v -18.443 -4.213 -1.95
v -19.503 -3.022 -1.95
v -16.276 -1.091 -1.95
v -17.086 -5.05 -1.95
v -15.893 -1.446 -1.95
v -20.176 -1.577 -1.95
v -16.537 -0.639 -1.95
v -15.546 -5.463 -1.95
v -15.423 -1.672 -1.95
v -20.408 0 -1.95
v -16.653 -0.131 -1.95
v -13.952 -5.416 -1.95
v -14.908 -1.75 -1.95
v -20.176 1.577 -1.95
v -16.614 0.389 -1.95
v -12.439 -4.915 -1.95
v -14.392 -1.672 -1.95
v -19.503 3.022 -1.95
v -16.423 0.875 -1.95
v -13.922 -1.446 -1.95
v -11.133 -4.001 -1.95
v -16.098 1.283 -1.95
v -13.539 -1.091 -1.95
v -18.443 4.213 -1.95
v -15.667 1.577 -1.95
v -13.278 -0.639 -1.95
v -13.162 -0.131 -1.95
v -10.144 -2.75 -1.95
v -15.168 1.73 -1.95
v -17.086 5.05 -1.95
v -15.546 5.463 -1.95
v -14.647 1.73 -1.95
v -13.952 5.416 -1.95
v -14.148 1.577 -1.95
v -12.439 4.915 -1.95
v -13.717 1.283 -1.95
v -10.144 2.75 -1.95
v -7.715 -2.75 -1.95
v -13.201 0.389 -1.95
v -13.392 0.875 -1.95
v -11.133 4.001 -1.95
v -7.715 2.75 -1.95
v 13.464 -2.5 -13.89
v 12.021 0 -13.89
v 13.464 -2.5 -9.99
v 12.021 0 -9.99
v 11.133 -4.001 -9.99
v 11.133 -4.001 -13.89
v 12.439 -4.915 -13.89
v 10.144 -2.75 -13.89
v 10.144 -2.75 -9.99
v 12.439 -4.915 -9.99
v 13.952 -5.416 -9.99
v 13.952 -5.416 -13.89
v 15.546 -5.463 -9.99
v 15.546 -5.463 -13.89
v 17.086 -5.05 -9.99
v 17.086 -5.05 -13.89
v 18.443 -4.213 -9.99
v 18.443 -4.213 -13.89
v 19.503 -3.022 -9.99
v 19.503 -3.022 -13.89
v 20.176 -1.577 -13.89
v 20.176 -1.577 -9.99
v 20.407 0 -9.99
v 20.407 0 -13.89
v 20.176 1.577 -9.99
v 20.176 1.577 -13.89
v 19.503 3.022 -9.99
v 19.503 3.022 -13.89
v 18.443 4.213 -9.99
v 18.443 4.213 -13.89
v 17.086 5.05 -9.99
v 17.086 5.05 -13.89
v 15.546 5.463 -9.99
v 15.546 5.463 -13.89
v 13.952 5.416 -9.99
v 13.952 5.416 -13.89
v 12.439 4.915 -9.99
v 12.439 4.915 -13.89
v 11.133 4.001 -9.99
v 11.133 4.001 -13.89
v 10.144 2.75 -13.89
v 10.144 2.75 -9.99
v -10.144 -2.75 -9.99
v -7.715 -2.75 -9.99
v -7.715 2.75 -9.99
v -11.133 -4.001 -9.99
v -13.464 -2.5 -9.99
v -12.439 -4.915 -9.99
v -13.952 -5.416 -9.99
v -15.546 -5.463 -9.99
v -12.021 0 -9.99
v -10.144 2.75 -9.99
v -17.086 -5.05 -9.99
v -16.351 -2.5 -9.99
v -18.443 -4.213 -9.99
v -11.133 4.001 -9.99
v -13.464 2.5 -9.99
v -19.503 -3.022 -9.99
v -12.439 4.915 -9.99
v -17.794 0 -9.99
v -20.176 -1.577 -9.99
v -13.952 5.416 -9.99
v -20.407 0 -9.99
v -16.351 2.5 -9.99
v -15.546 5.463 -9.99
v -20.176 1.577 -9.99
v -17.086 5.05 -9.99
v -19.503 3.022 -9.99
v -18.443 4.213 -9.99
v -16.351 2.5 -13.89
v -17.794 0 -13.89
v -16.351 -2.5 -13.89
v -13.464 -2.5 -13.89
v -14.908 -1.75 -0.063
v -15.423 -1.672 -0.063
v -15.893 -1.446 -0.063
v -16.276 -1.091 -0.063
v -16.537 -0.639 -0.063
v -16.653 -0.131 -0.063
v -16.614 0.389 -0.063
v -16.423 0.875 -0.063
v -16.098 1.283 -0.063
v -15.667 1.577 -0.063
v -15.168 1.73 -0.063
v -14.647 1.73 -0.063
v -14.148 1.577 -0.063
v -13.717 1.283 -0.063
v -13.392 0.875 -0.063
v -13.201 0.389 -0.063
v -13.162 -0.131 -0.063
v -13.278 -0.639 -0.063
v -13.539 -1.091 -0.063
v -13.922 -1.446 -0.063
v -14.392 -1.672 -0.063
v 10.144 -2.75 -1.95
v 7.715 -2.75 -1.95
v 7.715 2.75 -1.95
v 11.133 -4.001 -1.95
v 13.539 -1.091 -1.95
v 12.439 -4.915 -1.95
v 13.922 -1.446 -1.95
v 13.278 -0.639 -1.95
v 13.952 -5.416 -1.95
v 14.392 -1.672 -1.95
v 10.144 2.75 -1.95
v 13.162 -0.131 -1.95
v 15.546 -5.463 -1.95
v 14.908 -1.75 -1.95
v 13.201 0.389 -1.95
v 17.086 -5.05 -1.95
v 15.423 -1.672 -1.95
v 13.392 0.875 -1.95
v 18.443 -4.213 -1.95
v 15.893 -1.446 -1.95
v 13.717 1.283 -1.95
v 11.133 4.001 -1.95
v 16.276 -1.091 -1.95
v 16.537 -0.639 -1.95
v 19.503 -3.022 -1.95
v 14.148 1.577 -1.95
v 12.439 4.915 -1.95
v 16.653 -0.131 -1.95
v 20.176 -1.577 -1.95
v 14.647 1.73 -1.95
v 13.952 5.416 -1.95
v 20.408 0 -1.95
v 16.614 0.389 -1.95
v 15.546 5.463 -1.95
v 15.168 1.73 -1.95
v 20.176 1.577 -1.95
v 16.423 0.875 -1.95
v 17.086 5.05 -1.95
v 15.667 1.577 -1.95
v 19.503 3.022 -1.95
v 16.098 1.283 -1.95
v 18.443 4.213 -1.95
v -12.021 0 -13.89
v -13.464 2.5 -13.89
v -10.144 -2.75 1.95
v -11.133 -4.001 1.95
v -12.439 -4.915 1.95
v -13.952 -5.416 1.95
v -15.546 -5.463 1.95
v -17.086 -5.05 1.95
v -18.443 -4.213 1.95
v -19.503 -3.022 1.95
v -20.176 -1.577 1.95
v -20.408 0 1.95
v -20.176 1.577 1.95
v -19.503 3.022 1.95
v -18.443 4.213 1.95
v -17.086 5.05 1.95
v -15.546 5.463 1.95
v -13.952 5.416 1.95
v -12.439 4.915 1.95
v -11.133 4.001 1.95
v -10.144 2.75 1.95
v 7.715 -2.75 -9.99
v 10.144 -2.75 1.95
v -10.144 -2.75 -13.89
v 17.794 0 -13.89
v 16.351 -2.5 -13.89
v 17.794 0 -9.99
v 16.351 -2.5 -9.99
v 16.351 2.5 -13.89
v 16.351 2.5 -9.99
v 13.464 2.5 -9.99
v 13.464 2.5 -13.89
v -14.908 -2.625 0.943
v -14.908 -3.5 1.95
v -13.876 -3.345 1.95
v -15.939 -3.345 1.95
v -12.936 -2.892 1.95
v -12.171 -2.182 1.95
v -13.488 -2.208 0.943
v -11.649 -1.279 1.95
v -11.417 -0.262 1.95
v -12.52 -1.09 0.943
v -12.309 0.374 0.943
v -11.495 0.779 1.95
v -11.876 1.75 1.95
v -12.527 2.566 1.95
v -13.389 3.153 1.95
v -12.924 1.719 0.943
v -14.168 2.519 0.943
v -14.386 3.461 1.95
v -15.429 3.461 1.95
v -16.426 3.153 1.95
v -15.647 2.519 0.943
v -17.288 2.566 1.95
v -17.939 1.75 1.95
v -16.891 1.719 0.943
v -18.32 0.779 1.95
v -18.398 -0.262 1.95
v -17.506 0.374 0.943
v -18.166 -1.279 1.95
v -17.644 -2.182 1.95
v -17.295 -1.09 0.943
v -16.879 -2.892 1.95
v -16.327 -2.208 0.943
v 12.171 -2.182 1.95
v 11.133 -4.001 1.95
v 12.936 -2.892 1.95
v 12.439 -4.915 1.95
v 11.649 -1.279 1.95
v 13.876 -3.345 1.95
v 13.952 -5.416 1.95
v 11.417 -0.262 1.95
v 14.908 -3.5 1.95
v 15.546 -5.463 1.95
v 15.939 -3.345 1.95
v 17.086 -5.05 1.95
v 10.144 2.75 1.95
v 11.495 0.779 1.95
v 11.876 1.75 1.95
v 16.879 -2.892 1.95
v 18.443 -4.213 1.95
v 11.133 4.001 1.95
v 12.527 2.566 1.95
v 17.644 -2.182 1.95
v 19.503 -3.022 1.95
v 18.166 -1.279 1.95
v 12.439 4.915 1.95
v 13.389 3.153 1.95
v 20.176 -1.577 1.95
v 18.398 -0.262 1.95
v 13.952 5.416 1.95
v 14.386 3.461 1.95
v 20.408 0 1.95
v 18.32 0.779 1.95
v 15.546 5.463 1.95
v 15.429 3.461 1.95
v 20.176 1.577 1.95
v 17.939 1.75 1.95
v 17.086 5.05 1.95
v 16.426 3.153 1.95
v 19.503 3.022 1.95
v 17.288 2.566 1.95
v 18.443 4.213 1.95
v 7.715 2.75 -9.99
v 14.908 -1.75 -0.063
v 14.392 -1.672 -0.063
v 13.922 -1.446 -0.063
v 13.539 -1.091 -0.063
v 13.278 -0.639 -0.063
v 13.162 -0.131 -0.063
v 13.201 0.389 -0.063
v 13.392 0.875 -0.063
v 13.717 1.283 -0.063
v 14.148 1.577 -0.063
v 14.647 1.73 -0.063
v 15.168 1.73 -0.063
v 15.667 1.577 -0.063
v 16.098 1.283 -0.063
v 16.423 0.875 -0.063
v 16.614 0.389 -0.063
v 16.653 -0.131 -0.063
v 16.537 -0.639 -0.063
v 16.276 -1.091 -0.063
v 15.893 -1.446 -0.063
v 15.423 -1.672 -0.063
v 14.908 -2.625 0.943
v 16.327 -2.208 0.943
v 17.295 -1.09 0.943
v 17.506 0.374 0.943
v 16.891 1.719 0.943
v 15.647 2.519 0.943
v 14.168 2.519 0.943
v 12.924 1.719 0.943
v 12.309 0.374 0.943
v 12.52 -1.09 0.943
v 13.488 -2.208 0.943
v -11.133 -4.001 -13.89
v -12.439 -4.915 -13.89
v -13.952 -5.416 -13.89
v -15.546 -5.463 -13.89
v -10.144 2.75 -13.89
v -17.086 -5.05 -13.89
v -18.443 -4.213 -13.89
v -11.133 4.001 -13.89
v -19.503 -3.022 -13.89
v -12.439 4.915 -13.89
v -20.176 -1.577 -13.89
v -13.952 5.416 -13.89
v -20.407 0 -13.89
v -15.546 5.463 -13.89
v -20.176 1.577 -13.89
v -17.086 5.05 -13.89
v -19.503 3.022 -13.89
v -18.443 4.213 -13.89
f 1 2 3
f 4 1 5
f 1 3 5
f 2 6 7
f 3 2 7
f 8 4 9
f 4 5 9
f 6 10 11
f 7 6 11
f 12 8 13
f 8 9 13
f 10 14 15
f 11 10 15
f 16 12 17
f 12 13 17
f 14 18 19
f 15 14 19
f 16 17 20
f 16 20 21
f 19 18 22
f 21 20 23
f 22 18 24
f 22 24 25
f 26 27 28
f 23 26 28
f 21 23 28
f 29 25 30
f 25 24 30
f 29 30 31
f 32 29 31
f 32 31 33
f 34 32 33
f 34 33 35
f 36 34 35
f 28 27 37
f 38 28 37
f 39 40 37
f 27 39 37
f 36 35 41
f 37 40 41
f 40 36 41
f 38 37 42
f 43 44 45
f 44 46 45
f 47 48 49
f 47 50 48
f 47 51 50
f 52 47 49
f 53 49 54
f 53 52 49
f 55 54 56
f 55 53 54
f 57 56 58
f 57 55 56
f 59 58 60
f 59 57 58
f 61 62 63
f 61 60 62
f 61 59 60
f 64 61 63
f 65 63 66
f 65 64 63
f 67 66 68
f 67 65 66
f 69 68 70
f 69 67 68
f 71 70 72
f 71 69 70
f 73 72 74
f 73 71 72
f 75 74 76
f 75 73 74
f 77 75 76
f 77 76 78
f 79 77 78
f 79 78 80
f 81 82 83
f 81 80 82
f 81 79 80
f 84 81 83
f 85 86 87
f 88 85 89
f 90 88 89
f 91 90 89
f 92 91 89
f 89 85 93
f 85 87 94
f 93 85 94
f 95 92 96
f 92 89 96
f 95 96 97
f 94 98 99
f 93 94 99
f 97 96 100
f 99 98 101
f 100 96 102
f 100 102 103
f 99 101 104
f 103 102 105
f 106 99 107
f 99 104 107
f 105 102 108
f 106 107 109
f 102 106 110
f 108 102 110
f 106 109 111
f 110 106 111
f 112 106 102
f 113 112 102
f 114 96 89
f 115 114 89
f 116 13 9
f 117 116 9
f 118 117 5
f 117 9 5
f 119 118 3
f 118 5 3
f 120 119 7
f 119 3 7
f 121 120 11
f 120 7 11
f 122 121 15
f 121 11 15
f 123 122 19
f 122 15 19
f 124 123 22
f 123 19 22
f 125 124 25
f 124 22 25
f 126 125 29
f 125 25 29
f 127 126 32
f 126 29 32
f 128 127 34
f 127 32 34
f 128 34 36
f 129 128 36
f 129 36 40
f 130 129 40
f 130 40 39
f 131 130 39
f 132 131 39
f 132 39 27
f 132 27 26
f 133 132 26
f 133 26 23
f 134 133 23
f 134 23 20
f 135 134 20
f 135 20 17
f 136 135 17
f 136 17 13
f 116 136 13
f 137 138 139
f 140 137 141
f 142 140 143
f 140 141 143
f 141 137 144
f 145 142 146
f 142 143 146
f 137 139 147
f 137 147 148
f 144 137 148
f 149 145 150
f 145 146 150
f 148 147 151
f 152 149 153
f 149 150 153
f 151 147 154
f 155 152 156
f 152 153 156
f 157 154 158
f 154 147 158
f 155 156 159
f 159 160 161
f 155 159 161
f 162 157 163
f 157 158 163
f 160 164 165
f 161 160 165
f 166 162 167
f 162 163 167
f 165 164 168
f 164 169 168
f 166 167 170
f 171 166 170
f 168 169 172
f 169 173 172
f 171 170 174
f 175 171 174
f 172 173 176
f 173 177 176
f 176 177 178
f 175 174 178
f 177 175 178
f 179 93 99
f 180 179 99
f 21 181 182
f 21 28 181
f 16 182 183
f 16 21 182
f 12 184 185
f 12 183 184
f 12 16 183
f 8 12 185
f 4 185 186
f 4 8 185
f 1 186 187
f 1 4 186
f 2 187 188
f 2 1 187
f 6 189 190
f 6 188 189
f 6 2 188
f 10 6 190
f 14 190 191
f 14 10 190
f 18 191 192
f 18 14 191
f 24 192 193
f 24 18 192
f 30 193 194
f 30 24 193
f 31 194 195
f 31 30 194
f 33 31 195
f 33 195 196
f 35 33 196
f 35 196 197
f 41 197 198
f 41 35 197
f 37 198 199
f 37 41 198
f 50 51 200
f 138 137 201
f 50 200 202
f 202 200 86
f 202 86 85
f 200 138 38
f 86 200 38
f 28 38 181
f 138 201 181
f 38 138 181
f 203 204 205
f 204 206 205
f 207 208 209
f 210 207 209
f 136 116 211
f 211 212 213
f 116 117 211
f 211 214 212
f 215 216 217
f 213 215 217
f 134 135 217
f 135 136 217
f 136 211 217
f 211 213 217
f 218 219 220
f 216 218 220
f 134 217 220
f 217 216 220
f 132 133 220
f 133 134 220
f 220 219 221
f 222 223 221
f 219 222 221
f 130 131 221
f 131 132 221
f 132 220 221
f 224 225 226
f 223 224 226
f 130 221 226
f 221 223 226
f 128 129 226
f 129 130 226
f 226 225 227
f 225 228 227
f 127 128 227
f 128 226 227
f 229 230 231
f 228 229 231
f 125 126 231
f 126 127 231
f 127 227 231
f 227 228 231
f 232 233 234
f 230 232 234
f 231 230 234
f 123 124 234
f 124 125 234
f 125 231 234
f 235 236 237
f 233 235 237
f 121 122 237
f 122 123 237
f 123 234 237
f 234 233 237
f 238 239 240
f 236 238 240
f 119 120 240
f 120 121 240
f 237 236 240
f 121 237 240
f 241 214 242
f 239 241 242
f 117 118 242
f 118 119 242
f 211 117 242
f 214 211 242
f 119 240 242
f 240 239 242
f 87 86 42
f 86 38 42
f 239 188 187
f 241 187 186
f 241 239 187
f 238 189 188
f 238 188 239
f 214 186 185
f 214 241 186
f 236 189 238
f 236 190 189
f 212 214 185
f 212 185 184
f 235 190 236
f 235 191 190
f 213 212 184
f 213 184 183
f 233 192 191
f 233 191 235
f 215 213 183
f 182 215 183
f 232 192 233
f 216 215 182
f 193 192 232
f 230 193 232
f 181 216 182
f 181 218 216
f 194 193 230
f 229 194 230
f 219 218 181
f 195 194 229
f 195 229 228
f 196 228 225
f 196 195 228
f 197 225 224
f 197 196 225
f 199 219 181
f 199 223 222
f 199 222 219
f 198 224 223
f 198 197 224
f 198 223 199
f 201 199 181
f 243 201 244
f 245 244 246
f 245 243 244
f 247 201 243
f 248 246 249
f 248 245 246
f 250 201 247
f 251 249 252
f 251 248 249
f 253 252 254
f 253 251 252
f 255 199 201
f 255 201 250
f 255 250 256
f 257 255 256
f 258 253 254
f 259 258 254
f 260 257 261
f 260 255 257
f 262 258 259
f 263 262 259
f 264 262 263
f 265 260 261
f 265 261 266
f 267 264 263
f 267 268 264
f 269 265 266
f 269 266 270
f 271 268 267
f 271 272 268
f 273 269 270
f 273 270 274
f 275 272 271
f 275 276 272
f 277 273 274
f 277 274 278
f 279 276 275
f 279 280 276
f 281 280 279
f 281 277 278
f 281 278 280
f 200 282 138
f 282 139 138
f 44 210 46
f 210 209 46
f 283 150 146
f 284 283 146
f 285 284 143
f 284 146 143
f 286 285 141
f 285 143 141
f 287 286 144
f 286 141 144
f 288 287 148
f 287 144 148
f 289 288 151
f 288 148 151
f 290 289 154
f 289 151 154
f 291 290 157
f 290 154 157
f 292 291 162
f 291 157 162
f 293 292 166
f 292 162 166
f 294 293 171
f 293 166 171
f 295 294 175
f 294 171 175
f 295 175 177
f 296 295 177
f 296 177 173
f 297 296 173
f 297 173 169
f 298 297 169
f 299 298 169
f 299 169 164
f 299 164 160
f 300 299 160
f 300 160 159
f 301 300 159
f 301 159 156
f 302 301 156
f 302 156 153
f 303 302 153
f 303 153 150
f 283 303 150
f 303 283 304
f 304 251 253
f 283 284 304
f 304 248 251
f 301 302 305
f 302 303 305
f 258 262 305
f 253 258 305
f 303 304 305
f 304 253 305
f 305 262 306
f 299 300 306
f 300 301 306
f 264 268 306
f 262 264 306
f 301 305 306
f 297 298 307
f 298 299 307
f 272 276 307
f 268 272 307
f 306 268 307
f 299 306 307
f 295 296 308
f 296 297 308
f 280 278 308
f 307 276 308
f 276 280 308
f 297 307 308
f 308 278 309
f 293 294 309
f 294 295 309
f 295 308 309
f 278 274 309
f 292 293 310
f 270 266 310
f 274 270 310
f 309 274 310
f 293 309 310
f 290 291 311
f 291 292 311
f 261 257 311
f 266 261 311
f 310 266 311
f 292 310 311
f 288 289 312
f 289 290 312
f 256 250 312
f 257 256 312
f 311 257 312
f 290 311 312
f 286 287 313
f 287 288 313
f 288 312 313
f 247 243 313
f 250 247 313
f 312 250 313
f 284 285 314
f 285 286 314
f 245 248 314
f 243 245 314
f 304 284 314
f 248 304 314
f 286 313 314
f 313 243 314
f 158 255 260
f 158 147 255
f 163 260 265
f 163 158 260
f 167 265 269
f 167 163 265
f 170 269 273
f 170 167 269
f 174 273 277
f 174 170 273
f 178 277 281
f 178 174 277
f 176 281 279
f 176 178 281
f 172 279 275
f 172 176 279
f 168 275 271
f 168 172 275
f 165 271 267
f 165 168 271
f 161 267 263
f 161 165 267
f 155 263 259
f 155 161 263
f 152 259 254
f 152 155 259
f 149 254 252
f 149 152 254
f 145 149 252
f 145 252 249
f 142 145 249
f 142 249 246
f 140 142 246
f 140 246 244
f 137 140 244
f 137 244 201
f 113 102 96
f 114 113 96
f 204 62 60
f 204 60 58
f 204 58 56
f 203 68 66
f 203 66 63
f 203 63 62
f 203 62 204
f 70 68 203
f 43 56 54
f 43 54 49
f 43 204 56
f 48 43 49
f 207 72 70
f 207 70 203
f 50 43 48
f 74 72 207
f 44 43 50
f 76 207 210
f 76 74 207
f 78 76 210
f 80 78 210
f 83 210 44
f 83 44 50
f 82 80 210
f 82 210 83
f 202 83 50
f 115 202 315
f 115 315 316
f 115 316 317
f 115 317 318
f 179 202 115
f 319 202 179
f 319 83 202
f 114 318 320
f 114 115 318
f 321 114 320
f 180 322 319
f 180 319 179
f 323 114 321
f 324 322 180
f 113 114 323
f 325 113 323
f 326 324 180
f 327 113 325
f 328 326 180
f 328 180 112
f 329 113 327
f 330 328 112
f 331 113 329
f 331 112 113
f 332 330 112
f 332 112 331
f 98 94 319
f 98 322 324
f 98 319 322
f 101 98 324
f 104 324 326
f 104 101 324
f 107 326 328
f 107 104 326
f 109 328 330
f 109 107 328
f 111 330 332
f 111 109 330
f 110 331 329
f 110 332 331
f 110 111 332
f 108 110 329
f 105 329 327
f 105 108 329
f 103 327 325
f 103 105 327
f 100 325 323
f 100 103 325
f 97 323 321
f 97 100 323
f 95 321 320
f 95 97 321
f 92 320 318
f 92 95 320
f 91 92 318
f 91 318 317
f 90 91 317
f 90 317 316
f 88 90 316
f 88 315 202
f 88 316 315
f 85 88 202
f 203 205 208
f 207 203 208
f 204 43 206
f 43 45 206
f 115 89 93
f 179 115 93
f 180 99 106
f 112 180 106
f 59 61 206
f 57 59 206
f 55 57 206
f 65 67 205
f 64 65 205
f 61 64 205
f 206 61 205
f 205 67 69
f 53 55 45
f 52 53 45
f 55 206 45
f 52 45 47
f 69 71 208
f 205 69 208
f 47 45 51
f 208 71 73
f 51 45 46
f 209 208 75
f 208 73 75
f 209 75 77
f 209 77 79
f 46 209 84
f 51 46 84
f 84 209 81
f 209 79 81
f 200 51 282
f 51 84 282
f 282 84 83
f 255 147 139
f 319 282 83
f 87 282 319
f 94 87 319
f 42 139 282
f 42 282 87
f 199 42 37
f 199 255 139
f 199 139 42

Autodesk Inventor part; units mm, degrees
ref_plane "YZ Plane" through (0, 0, 0) normal (1, 0, 0) x (0, 1, 0)
ref_plane "XZ Plane" through (0, 0, 0) normal (0, 1, 0) x (-1, 0, 0)
ref_plane "XY Plane" through (0, 0, 0) normal (0, 0, 1) x (1, 0, 0)
sketch "Esboço1" plane through (0, 0, 0) normal (0, 0, 1) x (1, 0, 0)
  line L0 (-10.1444, 2.75) -> (10.1444, 2.75)
  line L1 (-10.1444, -2.75) -> (10.1444, -2.75)
  circle A0 centre (-14.9075, 0) radius 5.5
  circle A1 centre (14.9075, 0) radius 5.5
  circle A2 centre (-14.9075, 0) radius 3.5
  circle A3 centre (14.9075, 0) radius 3.5
  point P0 (0, 0)
  point P1 (0, 2.75)
  point P2 (0, -2.75)
  dimension "d7" = 11
  dimension "d5" = 2.75
  dimension "d6" = 2.75
  dimension "d9" = 14.9075
  dimension "d11" = 29.815
  dimension "d12" = 7
  dimension "d13" = 7
extrude "Extrusão1" add sketch "Esboço1" along normal mid plane 3.9 contours L0 A1 L1 A0 | A0 | A1 | A2 | A3
sketch "Esboço2" plane through (0, 0, -1.95) normal (0, 0, -1) x (-1, 0, 0)
  line L0 (-7.7154, -2.75) -> (7.7154, -2.75)
  line L1 (7.7154, -2.75) -> (7.7154, 2.75)
  line L2 (7.7154, 2.75) -> (-7.7154, 2.75)
  line L3 (-7.7154, 2.75) -> (-7.7154, -2.75)
  line L4 (-7.7154, -2.75) -> (7.7154, 2.75) construction
  line L5 (7.7154, -2.75) -> (-7.7154, 2.75) construction
  line L6 (10.1444, 2.75) -> (-10.1444, 2.75) projected
  line L7 (-10.1444, -2.75) -> (10.1444, -2.75) projected
  point P0 (0, 0)
  point P1 (0, 2.75)
  point P2 (0, -2.75)
  point P3 (7.7154, 0)
  point P4 (0, 2.75)
  dimension "d21" = 15.4307
extrude "Extrusão2" add sketch "Esboço2" along normal blind 8.04
sketch "Esboço3" plane through (0, 0, 1.95) normal (0, 0, 1) x (1, 0, 0)
  arc A0 (10.1444, -2.75) -> (10.1444, 2.75) centre (14.9075, 0) ccw projected
  point P0 (0, 0)
hole "Furo1" at (14.9075, 0, 1.95) direction (0, 0, -1) diameter 3.5 end through all countersink diameter 7 countersink angle 82
sketch "Esboço4" plane through (0, 0, 1.95) normal (0, 0, 1) x (1, 0, 0)
  arc A0 (-10.1444, 2.75) -> (-10.1444, -2.75) centre (-14.9075, 0) ccw projected
  point P0 (0, 0)
hole "Furo2" at (-14.9075, 0, 1.95) direction (0, 0, -1) diameter 3.5 end through all countersink diameter 7 countersink angle 82
sketch "Esboço5" plane through (0, 0, -9.99) normal (0, 0, -1) x (-1, 0, 0)
  arc A0 (-10.1444, 2.75) -> (-10.1444, -2.75) centre (-14.9075, 0) ccw projected
  circle A1 centre (-14.9075, 0) radius 5.5
  arc A2 (10.1444, -2.75) -> (10.1444, 2.75) centre (14.9075, 0) ccw projected
  circle A3 centre (14.9075, 0) radius 5.5
  line L0 (-10.1444, 2.75) -> (10.1444, 2.75)
  line L1 (-10.1444, -2.75) -> (10.1444, -2.75)
  line L2 (-13.4641, 2.5) -> (-12.0207, 0)
  line L3 (-12.0207, 0) -> (-13.4641, -2.5)
  line L4 (-13.4641, -2.5) -> (-16.3509, -2.5)
  line L5 (-16.3509, -2.5) -> (-17.7943, 0)
  line L6 (-17.7943, 0) -> (-16.3509, 2.5)
  line L7 (-16.3509, 2.5) -> (-13.4641, 2.5)
  line L8 (16.3509, 2.5) -> (17.7943, 0)
  line L9 (17.7943, 0) -> (16.3509, -2.5)
  line L10 (16.3509, -2.5) -> (13.4641, -2.5)
  line L11 (13.4641, -2.5) -> (12.0207, 0)
  line L12 (12.0207, 0) -> (13.4641, 2.5)
  line L13 (13.4641, 2.5) -> (16.3509, 2.5)
  point P0 (0, 0)
  point P1 (-14.9075, 2.5)
  point P2 (14.9075, 2.5)
  dimension "d37" = 11
  dimension "d38" = 3
  dimension "d39" = 3
extrude "Extrusão3" add sketch "Esboço5" along normal blind 3.9
equation "\"d6\" = d5"
properties part number "Barra1_0001_001" material "Titânio"
